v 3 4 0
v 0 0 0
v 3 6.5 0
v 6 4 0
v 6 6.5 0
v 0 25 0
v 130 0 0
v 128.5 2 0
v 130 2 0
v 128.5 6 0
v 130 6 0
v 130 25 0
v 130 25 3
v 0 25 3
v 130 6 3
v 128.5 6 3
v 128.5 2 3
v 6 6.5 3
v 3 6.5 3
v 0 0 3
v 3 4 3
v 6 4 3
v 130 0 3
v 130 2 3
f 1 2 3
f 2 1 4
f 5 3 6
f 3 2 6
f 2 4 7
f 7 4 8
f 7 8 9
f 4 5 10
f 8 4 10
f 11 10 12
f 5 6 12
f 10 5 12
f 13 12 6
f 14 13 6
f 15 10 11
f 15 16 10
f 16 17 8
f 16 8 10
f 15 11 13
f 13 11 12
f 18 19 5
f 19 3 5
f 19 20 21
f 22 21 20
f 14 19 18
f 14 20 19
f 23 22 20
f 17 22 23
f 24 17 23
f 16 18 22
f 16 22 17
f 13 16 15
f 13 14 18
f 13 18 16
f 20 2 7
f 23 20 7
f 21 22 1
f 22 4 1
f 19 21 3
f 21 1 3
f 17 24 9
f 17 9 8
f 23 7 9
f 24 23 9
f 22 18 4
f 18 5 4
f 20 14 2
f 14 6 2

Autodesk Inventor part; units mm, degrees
ref_plane "YZ Plane" through (0, 0, 0) normal (1, 0, 0) x (0, 1, 0)
ref_plane "XZ Plane" through (0, 0, 0) normal (0, 1, 0) x (-1, 0, 0)
ref_plane "XY Plane" through (0, 0, 0) normal (0, 0, 1) x (1, 0, 0)
sketch "Sketch1" plane through (0, 0, 0) normal (0, 0, 1) x (1, 0, 0)
  line L0 (0, 0) -> (130, 0)
  line L1 (130, 0) -> (130, 25)
  line L2 (130, 25) -> (0, 25)
  line L3 (0, 25) -> (0, 0)
  line L4 (3, 6.5) -> (6, 6.5)
  line L5 (6, 6.5) -> (6, 4)
  line L6 (6, 4) -> (3, 4)
  line L7 (3, 4) -> (3, 6.5)
  dimension "d0" = 130
  dimension "d1" = 25
  dimension "d2" = 3
  dimension "d3" = 2.5
  dimension "d4" = 3
  dimension "d5" = 4
extrude "Extrusion1" add sketch "Sketch1" along normal blind 3
sketch "Sketch2" plane through (0, 0, 3) normal (0, 0, 1) x (1, 0, 0)
  line L0 (130, 0) -> (130, 25) projected
  line L1 (130, 2) -> (128.5, 2)
  line L2 (128.5, 2) -> (128.5, 6)
  line L3 (128.5, 6) -> (130, 6)
  line L4 (130, 6) -> (130, 2)
  line L5 (0, 0) -> (130, 0) projected
  dimension "d8" = 1.5
  dimension "d9" = 4
  dimension "d10" = 2
extrude "Extrusion2" cut sketch "Sketch2" against normal through all
properties part number "door"
